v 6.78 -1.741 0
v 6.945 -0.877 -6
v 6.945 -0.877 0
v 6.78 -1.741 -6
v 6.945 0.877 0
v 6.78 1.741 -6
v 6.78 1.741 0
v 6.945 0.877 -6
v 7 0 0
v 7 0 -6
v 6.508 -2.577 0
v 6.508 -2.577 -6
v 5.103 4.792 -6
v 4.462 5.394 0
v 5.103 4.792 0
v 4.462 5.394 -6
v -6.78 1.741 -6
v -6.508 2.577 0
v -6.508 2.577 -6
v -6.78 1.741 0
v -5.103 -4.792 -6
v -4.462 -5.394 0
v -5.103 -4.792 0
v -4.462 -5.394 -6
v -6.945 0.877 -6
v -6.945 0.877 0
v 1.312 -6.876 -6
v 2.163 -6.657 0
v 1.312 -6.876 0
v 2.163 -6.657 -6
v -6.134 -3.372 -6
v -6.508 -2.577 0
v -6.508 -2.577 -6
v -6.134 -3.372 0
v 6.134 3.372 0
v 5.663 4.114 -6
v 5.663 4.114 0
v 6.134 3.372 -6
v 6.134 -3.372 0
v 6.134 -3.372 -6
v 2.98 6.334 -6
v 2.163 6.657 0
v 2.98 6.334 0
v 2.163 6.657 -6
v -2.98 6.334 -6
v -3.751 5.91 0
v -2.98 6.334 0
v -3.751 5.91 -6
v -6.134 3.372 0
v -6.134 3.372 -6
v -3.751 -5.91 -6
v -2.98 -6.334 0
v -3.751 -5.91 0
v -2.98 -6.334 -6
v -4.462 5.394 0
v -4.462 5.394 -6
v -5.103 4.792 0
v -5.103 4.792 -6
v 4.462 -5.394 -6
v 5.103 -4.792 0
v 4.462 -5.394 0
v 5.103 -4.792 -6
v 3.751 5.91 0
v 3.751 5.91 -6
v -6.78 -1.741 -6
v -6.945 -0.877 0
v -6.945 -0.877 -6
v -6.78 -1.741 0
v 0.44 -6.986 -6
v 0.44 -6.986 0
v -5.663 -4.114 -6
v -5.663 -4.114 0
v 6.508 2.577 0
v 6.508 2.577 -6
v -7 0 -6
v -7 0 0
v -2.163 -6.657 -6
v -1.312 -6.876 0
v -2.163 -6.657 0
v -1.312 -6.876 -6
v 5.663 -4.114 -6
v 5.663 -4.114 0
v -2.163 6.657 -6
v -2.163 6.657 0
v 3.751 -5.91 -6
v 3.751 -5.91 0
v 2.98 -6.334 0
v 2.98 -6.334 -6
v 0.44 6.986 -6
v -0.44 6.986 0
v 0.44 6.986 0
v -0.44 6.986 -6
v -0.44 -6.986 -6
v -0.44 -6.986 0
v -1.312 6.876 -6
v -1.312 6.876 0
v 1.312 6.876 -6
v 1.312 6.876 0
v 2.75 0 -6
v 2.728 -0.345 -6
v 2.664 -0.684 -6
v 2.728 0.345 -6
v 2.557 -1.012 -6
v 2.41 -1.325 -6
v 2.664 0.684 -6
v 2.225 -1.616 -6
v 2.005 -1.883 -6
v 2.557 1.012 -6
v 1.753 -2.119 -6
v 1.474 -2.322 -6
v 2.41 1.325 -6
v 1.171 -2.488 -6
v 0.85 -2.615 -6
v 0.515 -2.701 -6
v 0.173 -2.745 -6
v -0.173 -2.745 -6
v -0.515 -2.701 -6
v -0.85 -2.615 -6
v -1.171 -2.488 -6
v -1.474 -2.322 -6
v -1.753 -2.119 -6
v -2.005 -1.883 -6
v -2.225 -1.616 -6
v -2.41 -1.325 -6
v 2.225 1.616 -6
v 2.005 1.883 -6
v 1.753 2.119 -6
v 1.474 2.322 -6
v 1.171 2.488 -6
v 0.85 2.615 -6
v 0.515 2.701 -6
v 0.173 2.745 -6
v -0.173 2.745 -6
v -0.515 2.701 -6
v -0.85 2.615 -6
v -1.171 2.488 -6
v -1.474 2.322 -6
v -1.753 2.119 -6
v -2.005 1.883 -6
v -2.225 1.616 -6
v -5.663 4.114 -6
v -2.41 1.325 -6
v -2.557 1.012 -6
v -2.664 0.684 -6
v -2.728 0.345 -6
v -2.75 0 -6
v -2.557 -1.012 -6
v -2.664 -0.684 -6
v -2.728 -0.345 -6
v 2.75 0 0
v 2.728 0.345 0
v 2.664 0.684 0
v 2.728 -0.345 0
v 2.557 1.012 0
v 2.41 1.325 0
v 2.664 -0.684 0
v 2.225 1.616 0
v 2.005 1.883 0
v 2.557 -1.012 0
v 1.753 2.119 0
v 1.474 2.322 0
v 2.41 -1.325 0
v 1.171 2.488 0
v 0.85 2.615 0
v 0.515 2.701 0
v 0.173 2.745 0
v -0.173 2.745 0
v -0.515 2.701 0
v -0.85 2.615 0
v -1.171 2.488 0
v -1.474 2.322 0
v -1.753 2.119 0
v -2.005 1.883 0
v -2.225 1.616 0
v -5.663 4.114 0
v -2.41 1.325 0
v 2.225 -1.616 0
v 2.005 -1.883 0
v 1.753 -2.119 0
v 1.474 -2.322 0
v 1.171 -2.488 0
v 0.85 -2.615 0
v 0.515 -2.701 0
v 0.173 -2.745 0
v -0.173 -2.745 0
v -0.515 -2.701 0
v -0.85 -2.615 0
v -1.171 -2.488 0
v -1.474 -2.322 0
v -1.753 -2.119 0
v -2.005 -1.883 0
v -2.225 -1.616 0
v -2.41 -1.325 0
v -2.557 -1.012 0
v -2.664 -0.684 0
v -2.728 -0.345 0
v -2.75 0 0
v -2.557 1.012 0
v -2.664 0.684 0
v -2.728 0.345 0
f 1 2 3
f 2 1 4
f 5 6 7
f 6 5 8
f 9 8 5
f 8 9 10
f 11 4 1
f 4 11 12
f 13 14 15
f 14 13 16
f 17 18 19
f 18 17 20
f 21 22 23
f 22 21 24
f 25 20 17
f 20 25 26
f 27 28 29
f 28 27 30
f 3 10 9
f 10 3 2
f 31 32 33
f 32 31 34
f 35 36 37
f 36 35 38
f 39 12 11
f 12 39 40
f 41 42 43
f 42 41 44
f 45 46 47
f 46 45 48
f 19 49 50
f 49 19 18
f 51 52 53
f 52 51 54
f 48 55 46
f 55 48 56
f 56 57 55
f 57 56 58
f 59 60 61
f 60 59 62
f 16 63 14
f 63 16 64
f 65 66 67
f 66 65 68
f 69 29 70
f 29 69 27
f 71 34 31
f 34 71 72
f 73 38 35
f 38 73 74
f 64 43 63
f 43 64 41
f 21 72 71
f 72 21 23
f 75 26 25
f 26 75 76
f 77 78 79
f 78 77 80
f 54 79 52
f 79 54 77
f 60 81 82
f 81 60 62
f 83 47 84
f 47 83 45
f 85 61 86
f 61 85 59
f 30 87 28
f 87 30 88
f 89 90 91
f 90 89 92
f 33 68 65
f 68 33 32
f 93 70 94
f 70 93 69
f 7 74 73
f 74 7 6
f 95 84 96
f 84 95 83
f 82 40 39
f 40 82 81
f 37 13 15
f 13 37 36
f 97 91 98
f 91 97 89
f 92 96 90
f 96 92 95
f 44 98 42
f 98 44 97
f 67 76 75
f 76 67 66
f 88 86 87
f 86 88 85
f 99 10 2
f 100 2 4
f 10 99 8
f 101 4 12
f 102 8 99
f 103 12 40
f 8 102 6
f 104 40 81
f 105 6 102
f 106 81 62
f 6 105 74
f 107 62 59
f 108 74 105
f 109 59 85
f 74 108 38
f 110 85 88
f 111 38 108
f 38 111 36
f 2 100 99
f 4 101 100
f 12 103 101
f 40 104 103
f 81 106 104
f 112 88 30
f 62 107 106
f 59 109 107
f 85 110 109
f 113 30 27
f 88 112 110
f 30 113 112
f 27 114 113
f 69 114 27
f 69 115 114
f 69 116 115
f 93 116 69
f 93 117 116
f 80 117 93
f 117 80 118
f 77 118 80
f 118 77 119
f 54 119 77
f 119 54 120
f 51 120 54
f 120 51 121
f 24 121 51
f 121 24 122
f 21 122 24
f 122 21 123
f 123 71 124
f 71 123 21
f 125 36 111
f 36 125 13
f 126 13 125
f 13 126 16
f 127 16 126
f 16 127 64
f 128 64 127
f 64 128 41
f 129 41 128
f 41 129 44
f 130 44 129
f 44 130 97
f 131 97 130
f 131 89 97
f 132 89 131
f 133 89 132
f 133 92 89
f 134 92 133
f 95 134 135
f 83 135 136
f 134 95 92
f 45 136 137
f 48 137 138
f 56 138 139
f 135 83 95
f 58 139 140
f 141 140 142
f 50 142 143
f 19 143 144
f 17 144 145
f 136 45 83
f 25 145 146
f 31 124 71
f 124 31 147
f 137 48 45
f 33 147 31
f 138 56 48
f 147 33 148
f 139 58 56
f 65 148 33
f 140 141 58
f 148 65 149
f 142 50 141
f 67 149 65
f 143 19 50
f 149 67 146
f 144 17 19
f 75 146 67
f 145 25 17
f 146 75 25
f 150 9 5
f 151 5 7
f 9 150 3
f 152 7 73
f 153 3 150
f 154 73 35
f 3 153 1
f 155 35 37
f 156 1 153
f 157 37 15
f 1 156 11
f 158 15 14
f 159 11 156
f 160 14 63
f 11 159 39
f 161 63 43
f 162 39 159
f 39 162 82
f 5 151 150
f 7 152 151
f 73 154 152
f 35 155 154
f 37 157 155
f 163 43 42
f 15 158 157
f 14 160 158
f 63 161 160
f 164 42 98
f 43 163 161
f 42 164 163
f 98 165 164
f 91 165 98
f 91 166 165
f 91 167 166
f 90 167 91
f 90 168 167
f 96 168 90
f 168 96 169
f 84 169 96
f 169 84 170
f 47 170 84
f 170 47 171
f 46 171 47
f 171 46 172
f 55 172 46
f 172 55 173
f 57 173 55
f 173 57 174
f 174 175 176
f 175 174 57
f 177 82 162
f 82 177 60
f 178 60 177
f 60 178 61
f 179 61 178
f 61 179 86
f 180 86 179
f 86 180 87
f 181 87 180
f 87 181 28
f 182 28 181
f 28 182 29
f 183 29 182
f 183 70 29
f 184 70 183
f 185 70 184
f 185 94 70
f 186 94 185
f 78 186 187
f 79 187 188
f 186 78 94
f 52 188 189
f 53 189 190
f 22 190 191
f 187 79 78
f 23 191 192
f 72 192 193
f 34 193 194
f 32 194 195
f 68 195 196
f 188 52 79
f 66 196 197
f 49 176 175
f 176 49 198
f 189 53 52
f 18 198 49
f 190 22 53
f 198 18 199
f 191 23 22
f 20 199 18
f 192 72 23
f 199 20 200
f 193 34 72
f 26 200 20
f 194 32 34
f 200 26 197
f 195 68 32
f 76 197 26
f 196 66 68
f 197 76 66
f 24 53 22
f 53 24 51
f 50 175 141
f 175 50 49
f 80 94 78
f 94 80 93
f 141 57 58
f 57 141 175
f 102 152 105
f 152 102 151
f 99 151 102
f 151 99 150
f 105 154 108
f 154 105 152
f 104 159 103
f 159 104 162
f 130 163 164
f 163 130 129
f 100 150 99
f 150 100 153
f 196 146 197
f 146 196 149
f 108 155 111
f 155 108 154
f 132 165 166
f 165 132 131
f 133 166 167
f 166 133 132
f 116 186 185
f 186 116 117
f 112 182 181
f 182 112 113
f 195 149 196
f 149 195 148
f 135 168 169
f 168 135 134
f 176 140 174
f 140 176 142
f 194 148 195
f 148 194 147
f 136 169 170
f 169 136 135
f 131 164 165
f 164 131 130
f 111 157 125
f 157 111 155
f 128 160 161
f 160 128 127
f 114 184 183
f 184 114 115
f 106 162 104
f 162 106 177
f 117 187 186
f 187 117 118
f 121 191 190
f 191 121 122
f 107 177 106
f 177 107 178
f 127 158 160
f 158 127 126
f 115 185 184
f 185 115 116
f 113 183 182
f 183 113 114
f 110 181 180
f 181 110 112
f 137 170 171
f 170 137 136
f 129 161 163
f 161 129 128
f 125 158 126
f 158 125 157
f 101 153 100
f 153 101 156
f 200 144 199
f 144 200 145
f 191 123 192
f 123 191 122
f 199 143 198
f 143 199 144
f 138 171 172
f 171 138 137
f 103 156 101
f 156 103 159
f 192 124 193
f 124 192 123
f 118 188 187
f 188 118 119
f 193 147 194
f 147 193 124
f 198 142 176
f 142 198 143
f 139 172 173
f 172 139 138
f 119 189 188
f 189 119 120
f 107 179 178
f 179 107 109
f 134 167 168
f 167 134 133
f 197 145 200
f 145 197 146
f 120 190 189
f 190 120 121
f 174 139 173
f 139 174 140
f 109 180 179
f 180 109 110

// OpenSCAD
$fn = 50;


difference() {
	union() {
		translate(v = [0, 0, -6.0000000000]) {
			cylinder(h = 6, r = 7.0000000000);
		}
		cylinder(h = 0, r = 13.0000000000);
	}
	union() {
		#translate(v = [0, 0, -6]) {
			cylinder(h = 6, r = 2.7500000000);
		}
	}
}
